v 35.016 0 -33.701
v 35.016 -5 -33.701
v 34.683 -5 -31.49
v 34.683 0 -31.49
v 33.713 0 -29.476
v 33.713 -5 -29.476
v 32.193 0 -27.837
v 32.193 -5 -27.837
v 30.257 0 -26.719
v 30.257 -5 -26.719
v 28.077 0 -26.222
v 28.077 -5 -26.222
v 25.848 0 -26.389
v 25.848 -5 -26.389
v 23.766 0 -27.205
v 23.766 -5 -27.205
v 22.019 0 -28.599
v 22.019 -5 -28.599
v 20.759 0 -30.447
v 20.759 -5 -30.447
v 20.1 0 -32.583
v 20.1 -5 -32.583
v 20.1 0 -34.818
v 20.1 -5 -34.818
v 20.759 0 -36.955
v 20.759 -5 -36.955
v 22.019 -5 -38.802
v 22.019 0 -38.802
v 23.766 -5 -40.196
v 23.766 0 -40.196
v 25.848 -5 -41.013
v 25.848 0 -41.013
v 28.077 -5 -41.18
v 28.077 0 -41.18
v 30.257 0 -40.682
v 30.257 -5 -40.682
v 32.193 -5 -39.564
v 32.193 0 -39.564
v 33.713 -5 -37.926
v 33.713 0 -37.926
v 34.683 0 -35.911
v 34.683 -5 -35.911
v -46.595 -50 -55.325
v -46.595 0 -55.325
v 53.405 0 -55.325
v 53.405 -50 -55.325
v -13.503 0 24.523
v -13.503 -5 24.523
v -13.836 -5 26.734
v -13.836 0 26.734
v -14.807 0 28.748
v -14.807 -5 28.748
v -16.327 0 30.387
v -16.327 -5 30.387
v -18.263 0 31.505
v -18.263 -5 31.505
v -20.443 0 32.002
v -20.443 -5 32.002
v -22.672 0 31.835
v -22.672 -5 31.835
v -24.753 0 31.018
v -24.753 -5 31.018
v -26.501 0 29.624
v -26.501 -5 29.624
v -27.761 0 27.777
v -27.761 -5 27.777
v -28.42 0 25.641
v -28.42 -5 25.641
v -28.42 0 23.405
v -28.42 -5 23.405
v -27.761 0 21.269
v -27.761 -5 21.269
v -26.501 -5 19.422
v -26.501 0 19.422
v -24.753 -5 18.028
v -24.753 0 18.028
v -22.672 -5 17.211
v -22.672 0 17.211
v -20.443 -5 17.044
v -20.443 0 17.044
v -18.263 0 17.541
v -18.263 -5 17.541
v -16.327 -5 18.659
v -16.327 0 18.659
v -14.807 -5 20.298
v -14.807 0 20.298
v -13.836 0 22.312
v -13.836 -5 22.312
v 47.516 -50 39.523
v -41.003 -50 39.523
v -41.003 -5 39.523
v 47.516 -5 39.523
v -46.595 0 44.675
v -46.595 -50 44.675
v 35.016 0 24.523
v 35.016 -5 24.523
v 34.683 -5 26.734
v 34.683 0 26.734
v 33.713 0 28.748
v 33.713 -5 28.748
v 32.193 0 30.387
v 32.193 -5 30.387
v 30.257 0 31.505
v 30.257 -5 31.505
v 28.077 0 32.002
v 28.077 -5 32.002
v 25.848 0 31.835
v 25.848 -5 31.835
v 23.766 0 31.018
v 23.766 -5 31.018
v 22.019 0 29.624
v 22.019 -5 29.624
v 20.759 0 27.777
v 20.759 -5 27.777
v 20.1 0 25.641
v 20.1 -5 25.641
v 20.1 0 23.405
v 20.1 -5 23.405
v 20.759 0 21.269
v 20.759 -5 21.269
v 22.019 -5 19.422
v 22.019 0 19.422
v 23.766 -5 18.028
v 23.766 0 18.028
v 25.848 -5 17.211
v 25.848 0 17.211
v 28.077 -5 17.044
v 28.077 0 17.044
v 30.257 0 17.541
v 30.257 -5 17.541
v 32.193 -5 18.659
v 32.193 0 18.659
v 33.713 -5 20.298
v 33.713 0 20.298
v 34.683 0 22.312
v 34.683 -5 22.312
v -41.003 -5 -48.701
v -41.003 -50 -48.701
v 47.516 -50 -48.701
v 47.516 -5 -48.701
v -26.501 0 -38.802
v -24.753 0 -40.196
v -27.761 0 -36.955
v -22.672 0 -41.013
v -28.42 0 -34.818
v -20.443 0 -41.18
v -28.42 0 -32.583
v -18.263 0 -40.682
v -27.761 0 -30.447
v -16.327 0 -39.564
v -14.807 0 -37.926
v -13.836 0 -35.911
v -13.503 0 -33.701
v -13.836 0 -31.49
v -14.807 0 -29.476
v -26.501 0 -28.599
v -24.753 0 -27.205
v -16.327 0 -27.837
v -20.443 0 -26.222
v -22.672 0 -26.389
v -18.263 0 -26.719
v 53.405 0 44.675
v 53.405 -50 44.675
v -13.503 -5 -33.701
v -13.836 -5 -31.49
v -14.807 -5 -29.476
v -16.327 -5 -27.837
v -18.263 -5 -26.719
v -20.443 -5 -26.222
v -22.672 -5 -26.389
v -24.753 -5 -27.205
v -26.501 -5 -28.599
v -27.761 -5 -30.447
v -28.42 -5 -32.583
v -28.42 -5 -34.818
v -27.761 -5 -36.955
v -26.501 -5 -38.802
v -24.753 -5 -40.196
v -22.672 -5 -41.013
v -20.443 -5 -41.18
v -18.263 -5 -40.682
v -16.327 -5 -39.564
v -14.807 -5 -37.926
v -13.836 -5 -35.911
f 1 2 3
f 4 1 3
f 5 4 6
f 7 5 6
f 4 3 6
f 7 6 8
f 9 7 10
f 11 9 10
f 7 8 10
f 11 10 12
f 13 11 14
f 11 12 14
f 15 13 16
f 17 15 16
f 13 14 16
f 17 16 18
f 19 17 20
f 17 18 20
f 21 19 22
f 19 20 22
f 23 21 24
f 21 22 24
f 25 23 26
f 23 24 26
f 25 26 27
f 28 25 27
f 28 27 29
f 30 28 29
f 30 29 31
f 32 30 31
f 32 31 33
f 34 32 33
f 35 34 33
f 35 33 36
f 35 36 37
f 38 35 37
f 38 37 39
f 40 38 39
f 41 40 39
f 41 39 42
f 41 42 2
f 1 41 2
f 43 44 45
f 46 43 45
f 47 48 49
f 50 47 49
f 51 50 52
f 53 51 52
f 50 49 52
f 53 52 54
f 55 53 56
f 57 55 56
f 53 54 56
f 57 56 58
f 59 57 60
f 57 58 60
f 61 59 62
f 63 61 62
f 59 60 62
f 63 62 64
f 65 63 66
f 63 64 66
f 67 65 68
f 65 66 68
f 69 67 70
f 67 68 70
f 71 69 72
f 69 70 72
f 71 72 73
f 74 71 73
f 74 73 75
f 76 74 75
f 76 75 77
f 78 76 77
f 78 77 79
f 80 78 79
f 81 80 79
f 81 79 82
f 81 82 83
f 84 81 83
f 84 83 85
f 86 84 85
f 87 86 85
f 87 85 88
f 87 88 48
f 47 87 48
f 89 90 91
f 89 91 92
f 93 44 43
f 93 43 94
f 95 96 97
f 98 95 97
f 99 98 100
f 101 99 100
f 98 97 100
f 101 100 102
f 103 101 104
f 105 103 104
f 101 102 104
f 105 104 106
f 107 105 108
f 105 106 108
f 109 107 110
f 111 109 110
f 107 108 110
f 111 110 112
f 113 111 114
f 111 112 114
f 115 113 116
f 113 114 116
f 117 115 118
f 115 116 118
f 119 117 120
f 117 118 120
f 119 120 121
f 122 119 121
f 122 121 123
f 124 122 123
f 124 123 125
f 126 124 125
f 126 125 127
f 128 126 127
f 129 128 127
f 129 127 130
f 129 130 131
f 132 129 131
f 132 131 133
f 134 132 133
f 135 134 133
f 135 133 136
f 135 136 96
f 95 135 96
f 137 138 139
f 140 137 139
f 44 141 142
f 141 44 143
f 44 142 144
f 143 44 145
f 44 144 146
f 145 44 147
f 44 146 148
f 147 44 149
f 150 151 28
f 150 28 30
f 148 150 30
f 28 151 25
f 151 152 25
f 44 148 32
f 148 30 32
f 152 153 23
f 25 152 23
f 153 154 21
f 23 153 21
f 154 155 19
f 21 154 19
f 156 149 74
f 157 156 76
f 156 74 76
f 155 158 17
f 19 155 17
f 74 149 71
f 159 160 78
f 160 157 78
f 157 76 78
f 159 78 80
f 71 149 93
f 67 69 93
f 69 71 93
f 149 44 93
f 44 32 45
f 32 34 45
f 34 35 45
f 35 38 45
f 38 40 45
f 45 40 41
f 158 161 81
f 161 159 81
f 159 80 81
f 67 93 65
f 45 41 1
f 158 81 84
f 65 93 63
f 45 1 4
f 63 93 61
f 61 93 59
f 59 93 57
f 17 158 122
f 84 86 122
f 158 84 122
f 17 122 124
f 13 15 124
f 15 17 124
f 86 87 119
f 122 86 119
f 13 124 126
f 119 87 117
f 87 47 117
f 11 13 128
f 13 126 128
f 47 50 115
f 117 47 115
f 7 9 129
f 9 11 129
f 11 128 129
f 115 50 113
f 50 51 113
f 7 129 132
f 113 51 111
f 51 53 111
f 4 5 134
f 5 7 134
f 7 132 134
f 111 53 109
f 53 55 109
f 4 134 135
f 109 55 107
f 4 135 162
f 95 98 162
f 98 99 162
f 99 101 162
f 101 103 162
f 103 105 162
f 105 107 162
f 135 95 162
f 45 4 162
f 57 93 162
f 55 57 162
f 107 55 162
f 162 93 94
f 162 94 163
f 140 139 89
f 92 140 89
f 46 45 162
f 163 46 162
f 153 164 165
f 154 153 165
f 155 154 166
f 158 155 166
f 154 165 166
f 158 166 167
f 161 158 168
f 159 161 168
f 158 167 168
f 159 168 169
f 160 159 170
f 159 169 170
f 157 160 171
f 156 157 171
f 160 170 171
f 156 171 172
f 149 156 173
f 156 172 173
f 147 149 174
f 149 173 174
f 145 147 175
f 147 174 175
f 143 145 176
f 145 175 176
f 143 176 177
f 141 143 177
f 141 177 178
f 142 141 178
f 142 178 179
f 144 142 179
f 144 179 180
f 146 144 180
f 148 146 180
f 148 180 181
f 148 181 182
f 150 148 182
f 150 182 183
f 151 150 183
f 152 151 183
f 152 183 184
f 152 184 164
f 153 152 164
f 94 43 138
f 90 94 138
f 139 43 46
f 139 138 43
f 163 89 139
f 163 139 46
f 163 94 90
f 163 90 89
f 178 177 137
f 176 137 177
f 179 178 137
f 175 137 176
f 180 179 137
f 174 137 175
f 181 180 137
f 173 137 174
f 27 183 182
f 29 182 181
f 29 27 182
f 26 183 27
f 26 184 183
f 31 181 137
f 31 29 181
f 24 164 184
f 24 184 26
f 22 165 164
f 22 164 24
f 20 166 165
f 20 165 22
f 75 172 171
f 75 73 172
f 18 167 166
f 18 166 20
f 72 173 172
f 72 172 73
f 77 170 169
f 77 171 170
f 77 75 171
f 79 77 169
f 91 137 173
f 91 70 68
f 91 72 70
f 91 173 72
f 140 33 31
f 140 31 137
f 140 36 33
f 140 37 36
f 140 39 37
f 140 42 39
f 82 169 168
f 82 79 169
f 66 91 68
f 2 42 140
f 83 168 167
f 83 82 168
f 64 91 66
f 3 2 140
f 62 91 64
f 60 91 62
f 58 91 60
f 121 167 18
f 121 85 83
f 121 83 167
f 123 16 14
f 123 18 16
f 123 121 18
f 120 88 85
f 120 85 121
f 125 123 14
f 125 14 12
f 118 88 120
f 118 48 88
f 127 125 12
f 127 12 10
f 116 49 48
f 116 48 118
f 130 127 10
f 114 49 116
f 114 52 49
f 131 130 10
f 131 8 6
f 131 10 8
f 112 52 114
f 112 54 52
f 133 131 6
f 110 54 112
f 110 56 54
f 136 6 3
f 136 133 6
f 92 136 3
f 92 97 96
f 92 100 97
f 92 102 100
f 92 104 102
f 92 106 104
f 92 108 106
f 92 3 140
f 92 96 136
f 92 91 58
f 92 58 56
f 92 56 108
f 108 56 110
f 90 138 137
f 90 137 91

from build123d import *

# Parameters (mm, degrees)
F0_W     = 100
F0_H     = 100
F1_DEPTH = 50
F2_W     = 88.519738
F2_H     = 88.223688
F3_DEPTH = 45
F4_R     = 7.5
F5_DEPTH = 25


with BuildPart() as f1:
    # F0 (on Front) → F1 (new body)
    with BuildSketch(Plane.XZ):
        with Locations((3.404604, -5.325158)):
            Rectangle(F0_W, F0_H)
    extrude(amount=F1_DEPTH)

    # F2 (on face) → F3 (cut)
    with BuildSketch(Plane.XZ.offset(50)):
        with Locations((3.256578, -4.588816)):
            Rectangle(F2_W, F2_H)
    extrude(amount=-F3_DEPTH, mode=Mode.SUBTRACT)

    # F4 (on face) → F5 (cut)
    with BuildSketch(Plane.XZ.offset(5)):
        with Locations((-21.003291, 24.523028)):
            Circle(F4_R)
        with Locations((27.516447, 24.523028)):
            Circle(F4_R)
        with Locations((27.516447, -33.70066)):
            Circle(F4_R)
        with Locations((-21.003291, -33.70066)):
            Circle(F4_R)
    extrude(amount=-F5_DEPTH, mode=Mode.SUBTRACT)


solid = f1.part
